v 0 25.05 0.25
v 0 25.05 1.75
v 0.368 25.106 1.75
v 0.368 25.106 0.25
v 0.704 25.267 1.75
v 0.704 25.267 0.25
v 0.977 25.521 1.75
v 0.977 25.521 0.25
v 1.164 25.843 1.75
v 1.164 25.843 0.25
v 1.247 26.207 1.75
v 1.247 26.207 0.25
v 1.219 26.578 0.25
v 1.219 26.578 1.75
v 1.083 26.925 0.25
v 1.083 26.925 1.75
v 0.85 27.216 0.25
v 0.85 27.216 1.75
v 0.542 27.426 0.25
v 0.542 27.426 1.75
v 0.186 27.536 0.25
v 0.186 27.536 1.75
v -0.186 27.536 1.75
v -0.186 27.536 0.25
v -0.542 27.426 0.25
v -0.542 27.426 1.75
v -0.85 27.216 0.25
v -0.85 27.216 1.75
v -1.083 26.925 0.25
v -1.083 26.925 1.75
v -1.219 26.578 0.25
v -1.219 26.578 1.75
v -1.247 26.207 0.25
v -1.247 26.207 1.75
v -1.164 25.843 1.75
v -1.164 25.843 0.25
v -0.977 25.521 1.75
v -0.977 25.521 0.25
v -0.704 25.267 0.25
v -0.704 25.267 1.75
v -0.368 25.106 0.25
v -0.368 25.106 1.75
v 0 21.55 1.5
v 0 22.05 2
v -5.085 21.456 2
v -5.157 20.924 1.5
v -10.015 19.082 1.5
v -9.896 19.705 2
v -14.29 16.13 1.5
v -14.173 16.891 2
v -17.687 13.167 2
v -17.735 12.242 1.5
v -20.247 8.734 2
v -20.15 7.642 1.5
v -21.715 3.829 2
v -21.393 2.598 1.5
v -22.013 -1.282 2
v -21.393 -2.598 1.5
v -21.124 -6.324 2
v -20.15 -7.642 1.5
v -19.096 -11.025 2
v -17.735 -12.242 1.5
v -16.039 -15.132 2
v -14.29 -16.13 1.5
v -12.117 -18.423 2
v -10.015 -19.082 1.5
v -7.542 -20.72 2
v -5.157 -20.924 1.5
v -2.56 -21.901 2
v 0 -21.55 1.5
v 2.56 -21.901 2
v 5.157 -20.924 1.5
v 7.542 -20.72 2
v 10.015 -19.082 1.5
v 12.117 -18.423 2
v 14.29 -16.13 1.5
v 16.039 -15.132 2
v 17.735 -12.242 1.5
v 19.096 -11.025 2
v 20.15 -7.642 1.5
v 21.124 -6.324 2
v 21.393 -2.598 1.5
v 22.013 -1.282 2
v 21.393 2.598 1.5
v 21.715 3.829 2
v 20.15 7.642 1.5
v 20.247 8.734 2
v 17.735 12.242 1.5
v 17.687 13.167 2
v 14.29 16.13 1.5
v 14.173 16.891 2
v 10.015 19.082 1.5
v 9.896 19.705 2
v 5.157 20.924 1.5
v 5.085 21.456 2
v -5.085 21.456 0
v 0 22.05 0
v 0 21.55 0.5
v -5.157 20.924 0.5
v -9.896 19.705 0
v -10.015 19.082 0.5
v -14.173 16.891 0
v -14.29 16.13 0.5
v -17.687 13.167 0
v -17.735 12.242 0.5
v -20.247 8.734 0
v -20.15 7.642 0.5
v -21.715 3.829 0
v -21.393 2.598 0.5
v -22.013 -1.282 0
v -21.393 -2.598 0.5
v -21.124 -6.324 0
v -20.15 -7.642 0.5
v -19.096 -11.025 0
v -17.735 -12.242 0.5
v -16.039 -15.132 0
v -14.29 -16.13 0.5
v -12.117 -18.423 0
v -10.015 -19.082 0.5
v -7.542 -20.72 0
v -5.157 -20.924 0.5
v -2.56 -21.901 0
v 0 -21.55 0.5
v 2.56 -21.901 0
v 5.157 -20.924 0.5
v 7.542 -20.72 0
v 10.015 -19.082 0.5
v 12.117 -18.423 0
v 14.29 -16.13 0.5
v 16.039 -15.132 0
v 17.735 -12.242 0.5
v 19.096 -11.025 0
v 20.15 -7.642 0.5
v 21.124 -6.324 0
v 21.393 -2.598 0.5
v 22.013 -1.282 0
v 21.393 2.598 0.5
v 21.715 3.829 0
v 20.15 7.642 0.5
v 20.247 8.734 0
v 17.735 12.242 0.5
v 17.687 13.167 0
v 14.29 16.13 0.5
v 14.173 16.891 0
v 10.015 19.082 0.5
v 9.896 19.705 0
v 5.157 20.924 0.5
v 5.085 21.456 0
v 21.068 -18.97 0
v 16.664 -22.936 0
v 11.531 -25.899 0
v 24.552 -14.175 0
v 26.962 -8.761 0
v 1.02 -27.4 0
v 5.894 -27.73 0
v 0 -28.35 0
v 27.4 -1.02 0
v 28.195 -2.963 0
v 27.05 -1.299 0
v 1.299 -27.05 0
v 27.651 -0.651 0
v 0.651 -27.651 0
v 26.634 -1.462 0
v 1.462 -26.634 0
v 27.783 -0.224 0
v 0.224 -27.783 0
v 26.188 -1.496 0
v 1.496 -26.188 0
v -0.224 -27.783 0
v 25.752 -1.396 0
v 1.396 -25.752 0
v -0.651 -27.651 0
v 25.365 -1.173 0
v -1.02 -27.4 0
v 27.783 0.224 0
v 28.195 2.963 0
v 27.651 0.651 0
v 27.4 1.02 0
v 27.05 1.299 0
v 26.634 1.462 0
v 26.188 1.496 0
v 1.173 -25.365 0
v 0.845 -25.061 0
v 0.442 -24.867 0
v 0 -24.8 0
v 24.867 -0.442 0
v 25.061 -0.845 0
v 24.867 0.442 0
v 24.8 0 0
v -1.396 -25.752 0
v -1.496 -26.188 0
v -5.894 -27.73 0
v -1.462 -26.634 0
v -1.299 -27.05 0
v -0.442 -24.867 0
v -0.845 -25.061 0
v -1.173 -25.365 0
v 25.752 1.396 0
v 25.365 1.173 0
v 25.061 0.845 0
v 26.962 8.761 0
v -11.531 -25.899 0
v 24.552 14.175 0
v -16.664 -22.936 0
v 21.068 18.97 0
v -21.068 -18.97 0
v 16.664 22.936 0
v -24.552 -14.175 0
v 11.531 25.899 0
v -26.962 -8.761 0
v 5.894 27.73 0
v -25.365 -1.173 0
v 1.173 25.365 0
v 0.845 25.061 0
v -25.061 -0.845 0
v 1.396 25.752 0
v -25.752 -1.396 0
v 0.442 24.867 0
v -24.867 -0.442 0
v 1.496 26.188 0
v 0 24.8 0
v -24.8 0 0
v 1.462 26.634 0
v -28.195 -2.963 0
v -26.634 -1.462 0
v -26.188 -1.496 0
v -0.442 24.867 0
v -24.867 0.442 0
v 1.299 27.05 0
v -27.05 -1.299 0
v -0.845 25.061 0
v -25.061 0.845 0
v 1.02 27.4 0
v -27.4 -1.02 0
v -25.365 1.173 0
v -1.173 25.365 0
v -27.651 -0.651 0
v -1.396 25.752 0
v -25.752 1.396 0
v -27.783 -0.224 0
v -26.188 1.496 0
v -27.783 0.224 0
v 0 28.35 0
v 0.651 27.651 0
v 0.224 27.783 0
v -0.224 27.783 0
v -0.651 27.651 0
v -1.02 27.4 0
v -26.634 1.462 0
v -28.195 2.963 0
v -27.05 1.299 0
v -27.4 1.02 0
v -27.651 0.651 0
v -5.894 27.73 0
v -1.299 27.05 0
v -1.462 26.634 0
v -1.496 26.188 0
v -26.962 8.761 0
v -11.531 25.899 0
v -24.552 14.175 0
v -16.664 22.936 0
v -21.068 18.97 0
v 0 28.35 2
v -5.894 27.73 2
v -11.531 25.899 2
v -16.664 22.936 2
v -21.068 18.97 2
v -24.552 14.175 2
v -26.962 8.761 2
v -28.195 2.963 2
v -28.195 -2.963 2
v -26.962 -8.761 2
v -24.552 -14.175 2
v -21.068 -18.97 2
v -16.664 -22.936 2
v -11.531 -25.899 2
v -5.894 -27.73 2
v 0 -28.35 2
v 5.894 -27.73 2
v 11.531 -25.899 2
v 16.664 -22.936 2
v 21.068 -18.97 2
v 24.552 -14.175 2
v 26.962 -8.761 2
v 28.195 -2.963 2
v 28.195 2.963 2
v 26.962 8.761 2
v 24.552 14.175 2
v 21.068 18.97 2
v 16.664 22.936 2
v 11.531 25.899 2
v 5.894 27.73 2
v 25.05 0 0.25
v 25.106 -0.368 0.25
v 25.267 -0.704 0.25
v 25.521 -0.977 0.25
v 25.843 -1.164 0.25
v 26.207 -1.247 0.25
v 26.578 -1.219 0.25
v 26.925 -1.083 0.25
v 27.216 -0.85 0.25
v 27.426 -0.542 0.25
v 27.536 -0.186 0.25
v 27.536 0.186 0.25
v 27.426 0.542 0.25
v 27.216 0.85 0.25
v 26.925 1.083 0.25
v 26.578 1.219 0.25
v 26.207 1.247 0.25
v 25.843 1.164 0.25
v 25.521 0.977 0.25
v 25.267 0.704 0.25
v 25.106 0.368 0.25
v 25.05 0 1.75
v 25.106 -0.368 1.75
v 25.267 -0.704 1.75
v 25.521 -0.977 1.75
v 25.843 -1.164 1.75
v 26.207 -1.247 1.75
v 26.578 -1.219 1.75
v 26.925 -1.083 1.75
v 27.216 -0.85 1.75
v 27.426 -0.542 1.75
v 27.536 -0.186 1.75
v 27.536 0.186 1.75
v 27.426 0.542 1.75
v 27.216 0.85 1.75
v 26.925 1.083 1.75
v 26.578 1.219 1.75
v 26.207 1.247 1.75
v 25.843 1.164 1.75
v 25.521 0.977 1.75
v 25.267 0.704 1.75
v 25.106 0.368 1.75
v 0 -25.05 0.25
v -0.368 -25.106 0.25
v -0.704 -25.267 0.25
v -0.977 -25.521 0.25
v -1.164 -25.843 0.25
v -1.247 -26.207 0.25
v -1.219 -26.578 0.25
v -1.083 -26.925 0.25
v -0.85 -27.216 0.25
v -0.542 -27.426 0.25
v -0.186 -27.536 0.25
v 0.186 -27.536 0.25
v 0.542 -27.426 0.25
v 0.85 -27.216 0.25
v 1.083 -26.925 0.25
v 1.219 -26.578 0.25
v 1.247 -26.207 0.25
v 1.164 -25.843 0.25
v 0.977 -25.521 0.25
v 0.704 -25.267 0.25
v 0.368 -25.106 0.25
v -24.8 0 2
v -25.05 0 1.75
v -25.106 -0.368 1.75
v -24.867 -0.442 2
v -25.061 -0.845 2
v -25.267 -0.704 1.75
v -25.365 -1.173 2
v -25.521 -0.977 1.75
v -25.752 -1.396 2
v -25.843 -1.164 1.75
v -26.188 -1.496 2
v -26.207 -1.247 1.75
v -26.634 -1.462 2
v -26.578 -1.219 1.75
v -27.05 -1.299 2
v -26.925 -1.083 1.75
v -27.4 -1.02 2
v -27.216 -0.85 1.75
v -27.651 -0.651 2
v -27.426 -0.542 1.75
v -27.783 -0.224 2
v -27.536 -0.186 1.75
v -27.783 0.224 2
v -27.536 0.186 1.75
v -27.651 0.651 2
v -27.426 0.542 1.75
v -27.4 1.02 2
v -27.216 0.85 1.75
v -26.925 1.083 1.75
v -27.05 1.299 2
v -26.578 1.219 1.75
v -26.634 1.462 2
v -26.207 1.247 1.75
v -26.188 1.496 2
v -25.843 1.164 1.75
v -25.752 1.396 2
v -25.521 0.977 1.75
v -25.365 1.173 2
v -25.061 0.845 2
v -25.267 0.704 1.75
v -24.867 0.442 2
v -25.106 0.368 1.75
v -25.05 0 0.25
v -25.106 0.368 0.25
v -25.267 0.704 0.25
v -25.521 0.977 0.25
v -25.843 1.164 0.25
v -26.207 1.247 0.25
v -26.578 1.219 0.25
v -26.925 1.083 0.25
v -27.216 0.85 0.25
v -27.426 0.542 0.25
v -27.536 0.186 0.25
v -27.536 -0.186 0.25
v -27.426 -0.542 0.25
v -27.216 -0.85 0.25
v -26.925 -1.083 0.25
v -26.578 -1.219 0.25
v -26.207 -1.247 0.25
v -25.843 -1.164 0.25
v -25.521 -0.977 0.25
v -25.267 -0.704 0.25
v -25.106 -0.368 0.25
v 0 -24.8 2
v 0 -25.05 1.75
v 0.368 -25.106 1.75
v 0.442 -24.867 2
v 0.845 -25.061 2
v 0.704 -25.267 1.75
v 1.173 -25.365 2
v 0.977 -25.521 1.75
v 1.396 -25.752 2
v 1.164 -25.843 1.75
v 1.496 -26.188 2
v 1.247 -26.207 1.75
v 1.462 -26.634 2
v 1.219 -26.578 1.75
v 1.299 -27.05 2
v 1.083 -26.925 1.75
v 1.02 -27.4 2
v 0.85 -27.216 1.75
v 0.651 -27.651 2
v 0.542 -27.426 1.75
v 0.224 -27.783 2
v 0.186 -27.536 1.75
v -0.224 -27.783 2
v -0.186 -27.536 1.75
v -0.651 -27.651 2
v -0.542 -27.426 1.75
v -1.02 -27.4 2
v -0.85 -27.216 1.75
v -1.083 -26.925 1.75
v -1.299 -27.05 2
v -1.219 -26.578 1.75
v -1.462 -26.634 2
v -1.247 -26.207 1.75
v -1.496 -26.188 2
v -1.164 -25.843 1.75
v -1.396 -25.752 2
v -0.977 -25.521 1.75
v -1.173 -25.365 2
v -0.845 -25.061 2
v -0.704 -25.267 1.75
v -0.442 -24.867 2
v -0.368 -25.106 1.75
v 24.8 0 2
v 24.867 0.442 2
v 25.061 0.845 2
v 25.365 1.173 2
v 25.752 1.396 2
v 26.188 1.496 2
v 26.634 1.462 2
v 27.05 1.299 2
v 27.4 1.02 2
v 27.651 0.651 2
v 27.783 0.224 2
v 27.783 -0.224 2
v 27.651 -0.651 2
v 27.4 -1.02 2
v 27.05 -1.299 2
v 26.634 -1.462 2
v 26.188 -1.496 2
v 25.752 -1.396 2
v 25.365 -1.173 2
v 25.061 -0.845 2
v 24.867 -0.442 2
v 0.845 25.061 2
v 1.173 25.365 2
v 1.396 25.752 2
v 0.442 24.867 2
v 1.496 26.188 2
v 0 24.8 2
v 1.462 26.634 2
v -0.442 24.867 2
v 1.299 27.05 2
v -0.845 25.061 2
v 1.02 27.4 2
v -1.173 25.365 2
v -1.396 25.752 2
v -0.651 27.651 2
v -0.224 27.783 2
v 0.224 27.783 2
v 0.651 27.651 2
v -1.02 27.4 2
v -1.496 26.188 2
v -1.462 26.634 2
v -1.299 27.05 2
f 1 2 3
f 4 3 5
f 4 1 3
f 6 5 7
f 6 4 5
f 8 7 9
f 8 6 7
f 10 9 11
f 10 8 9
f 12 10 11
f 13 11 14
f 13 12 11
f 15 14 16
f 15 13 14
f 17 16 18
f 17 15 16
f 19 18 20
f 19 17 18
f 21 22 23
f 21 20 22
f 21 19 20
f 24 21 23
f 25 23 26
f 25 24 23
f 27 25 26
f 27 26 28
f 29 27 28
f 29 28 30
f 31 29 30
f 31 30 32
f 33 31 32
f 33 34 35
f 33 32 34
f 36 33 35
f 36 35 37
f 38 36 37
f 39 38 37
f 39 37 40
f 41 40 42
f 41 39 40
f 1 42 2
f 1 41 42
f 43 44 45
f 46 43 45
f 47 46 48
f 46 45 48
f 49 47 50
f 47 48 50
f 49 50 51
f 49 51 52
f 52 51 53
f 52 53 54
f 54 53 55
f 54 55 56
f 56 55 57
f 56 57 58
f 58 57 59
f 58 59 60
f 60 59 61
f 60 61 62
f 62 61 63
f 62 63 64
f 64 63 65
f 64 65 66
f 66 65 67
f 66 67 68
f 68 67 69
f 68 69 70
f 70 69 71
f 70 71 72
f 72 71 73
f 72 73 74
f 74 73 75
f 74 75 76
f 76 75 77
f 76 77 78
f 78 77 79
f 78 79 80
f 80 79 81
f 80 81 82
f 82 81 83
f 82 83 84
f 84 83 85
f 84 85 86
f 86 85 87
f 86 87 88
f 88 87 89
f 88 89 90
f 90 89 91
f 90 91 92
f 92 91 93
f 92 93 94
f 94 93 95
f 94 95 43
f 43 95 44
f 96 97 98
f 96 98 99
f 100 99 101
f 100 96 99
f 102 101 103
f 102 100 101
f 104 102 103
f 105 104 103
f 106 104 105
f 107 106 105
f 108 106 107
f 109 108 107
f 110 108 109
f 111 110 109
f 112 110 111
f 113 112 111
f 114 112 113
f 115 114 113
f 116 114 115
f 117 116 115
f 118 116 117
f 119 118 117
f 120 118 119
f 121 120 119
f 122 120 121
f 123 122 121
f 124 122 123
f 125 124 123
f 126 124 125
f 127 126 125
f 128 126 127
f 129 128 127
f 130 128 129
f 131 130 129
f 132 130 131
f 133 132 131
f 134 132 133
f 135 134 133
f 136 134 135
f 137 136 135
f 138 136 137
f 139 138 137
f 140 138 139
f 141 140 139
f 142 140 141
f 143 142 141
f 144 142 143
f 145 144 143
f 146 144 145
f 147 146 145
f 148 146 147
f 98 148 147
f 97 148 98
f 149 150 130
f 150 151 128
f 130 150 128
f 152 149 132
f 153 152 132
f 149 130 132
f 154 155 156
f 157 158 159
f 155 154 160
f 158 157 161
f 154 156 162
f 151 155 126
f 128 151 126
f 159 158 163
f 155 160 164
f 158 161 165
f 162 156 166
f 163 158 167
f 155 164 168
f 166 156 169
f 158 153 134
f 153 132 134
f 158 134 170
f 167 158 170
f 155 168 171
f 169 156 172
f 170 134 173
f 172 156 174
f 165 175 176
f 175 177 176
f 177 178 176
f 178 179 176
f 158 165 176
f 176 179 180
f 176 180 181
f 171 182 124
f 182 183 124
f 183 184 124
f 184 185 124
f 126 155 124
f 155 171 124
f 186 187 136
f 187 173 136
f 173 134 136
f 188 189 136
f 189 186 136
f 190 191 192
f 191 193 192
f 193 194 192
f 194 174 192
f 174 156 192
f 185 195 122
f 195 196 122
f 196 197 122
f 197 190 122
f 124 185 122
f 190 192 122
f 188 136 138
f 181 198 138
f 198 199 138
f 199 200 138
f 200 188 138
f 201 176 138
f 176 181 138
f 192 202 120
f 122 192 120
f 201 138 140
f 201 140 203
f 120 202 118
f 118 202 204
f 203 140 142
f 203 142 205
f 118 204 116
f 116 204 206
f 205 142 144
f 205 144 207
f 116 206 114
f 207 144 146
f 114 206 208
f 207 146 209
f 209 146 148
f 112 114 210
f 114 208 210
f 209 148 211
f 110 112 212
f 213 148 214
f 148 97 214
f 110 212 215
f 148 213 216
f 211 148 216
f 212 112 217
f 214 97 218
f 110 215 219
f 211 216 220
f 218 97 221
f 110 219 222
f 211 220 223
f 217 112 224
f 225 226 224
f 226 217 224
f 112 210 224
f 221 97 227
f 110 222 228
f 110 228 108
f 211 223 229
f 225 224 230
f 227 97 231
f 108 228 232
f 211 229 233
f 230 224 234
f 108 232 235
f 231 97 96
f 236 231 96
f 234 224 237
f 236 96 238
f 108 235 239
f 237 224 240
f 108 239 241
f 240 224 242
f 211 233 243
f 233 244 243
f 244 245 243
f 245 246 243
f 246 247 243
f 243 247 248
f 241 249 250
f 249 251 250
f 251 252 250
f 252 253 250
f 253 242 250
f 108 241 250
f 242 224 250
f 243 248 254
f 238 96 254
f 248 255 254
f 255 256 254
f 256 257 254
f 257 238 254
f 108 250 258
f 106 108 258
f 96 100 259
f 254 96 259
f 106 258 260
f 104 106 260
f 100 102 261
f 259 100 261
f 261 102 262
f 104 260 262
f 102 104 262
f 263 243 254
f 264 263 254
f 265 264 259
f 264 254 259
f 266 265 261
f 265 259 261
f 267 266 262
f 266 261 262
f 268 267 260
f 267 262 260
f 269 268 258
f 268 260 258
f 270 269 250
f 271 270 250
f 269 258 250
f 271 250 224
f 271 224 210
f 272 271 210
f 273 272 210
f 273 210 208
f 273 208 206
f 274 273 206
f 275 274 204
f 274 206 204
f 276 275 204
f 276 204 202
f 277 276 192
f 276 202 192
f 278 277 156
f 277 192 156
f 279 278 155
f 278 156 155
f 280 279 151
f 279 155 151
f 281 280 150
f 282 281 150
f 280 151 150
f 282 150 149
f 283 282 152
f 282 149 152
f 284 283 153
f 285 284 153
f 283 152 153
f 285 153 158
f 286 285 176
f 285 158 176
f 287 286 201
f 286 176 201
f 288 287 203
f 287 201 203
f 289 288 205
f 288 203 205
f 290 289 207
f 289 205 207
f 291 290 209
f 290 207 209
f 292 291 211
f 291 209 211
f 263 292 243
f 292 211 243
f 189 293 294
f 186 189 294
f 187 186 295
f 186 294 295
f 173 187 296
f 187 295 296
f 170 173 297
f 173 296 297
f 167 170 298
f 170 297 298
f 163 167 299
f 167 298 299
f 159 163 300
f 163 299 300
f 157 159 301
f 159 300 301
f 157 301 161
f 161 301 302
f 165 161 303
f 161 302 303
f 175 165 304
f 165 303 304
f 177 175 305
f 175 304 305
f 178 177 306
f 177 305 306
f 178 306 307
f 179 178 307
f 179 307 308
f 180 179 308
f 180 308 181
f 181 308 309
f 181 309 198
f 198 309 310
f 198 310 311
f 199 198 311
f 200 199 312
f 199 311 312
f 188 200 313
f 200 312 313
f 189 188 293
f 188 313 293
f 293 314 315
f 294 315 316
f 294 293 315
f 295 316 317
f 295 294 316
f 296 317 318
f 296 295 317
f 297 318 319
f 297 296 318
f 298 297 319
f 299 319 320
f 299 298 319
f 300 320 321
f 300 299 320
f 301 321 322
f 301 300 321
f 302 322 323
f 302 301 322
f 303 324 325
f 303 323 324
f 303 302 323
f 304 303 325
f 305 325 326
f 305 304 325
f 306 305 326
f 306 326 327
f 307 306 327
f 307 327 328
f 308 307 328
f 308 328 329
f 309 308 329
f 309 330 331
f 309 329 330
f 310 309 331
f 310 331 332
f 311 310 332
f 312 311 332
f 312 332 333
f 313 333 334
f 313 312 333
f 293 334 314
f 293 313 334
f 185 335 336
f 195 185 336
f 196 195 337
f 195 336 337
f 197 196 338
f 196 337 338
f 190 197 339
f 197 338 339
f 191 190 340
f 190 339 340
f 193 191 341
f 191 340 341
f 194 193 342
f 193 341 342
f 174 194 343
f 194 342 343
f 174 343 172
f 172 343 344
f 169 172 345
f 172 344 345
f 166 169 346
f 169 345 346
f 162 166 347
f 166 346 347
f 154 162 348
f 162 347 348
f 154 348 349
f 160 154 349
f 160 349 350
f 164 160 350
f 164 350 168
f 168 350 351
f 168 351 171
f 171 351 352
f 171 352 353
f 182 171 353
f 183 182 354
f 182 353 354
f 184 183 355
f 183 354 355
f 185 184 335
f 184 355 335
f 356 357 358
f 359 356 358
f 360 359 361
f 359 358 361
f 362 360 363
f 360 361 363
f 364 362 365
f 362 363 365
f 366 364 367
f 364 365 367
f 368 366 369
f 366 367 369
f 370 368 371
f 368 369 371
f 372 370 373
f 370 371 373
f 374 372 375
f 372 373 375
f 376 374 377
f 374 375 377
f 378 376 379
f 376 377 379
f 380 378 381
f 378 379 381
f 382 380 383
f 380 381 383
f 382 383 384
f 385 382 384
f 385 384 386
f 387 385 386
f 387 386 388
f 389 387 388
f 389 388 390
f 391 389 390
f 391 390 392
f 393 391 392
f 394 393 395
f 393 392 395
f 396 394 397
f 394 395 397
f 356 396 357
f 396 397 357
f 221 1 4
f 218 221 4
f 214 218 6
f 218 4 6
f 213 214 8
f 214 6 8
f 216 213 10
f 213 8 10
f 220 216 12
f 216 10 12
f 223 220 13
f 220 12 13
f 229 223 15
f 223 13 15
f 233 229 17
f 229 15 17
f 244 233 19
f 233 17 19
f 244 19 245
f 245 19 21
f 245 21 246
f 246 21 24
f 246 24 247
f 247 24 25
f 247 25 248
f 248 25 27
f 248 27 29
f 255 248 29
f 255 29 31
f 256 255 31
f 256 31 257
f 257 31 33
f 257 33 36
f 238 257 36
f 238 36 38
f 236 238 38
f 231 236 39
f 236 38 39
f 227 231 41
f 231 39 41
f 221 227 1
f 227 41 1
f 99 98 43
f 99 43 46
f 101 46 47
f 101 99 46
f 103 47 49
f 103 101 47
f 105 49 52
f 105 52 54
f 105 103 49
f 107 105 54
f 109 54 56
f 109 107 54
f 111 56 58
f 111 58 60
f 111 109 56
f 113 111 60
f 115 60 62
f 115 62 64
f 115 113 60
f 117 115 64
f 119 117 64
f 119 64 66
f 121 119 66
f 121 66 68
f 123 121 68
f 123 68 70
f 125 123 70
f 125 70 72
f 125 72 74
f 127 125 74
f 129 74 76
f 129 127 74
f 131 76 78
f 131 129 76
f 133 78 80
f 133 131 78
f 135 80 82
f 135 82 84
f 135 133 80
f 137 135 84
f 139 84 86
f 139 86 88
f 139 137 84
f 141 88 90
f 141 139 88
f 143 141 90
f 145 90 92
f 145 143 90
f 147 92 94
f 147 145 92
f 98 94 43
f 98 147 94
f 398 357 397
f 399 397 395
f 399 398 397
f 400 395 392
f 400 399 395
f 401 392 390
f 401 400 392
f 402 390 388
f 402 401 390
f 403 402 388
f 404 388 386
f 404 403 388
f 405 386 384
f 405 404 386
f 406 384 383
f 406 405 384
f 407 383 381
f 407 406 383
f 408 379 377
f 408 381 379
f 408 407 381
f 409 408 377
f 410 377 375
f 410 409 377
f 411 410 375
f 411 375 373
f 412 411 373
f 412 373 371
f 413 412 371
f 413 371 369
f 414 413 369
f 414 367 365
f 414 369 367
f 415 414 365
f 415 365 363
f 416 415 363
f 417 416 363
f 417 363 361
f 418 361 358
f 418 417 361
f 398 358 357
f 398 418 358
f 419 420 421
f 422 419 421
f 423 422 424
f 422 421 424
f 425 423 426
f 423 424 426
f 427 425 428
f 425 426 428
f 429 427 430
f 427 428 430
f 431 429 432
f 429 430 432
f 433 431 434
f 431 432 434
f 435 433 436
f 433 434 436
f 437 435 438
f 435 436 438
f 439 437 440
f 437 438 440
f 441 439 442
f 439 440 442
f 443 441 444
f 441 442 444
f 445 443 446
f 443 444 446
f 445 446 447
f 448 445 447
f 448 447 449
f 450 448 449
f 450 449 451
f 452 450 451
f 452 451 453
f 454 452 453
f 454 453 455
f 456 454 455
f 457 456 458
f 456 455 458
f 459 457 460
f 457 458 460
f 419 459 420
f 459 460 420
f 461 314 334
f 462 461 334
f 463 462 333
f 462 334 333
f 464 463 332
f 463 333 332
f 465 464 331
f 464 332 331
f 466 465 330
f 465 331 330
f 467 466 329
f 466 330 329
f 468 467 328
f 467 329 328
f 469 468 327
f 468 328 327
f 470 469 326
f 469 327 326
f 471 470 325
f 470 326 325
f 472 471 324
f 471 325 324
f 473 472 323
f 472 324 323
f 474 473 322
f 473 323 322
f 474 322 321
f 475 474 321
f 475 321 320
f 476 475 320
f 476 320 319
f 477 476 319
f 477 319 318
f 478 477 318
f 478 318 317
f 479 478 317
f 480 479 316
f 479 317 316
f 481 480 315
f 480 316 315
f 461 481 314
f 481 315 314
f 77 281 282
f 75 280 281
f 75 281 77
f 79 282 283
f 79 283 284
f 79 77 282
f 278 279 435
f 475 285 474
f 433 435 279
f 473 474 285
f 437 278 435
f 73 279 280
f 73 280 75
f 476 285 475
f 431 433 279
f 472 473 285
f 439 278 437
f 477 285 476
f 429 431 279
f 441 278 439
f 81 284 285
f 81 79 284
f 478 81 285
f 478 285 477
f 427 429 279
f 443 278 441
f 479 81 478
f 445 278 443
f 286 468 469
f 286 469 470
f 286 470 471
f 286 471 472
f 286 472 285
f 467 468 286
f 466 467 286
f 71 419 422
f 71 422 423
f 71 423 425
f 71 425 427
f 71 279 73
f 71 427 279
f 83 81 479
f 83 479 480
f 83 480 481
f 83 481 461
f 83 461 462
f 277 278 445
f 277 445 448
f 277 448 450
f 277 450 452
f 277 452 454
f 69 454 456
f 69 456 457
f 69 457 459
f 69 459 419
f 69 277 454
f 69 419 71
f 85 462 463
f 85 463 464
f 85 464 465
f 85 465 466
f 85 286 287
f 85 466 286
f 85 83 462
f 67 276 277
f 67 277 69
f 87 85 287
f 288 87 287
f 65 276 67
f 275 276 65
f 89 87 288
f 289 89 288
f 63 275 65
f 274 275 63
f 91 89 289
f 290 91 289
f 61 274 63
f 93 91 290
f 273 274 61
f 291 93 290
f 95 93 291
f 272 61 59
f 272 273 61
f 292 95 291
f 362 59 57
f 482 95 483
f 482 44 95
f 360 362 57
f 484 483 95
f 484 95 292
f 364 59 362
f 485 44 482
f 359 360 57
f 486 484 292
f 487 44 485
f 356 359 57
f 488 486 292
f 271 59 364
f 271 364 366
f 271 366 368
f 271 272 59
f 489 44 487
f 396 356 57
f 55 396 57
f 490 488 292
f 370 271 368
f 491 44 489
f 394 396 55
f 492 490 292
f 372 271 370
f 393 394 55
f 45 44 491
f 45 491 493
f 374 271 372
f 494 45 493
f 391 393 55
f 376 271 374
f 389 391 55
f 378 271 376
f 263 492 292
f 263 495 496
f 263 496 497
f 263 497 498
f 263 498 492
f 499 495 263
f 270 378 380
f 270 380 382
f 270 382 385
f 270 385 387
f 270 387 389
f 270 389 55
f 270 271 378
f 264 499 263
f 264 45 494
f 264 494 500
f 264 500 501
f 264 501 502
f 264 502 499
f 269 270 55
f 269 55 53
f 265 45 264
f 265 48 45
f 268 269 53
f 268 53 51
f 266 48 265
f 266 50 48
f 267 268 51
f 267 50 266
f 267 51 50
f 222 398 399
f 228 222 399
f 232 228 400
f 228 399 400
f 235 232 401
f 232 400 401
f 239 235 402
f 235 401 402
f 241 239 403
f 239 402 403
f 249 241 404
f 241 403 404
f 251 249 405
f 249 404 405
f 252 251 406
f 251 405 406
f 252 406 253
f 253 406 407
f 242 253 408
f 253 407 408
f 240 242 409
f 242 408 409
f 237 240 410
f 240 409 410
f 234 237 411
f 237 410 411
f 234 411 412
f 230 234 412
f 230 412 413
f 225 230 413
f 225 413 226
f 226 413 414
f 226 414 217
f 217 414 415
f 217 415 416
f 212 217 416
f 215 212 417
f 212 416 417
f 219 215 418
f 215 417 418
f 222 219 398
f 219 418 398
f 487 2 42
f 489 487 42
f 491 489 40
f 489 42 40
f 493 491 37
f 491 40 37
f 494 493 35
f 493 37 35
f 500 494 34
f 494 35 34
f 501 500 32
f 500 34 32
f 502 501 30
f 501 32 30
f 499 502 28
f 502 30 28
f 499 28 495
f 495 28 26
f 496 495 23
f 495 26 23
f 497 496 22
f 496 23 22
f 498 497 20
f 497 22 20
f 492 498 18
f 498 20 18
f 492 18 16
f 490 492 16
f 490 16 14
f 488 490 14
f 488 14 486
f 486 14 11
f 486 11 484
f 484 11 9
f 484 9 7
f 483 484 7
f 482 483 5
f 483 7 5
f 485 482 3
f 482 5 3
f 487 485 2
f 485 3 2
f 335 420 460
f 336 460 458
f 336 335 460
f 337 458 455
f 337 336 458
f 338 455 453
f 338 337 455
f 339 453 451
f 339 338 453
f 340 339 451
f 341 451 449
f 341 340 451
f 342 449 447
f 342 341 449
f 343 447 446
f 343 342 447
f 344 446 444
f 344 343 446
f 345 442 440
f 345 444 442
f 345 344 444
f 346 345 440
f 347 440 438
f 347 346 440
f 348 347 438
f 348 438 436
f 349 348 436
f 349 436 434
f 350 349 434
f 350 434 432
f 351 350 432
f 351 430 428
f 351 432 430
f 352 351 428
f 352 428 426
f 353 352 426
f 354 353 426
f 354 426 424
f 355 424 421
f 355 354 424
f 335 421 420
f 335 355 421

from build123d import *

# Parameters (mm, degrees)
SKETCH1_R           = 28.35
SKETCH1_R_2         = 21.55
EXTRUDE_THIN1_DEPTH = 2
CHAMFER1_SIZE       = 0.5
SKETCH2_R           = 1.25
CUT_EXTRUDE1_DEPTH  = 41.142807575
CIRPATTERN1_COUNT   = 4
CHAMFER2_SIZE       = 0.25


with BuildPart() as part:
    # Sketch1 → Extrude-Thin1 (new body)
    with BuildSketch(Plane(origin=(0, 0, 0), x_dir=(0, 1, 0), z_dir=(0, 0, 1))):
        Circle(SKETCH1_R)
        Circle(SKETCH1_R_2, mode=Mode.SUBTRACT)
    extrude(amount=EXTRUDE_THIN1_DEPTH)

    # Chamfer1
    chamfer1_edges = [part.edges().sort_by_distance(p)[0] for p in [
        (0, -21.55, 0),
        (0, -21.55, 2),
    ]]
    chamfer(chamfer1_edges, length=CHAMFER1_SIZE)

    # Sketch2 → Cut-Extrude1 (cut, through all)
    with BuildSketch(Plane(origin=(0, 0, 0), x_dir=(0, 1, 0), z_dir=(0, 0, 1))):
        with Locations(Location((0, 26.3, 0), (0, 0, 270))):
            Circle(SKETCH2_R)
    cut_extrude1 = extrude(amount=CUT_EXTRUDE1_DEPTH, mode=Mode.SUBTRACT)

    # CirPattern1: Cut-Extrude1 ×4 about axis
    cirpattern1_axis = Axis((0, 0, 0), (0, 0, 1))
    for i in range(1, CIRPATTERN1_COUNT):
        add(cut_extrude1.rotate(cirpattern1_axis, i * 360 / CIRPATTERN1_COUNT), mode=Mode.SUBTRACT)

    # Chamfer2
    chamfer2_edges = [part.edges().sort_by_distance(p)[0] for p in [
        (-27.55, 0, 0),
        (-27.55, 0, 2),
        (0, 27.55, 0),
        (0, 27.55, 2),
        (27.55, 0, 0),
        (27.55, 0, 2),
        (0, -27.55, 0),
        (0, -27.55, 2),
    ]]
    chamfer(chamfer2_edges, length=CHAMFER2_SIZE)


solid = part.part
